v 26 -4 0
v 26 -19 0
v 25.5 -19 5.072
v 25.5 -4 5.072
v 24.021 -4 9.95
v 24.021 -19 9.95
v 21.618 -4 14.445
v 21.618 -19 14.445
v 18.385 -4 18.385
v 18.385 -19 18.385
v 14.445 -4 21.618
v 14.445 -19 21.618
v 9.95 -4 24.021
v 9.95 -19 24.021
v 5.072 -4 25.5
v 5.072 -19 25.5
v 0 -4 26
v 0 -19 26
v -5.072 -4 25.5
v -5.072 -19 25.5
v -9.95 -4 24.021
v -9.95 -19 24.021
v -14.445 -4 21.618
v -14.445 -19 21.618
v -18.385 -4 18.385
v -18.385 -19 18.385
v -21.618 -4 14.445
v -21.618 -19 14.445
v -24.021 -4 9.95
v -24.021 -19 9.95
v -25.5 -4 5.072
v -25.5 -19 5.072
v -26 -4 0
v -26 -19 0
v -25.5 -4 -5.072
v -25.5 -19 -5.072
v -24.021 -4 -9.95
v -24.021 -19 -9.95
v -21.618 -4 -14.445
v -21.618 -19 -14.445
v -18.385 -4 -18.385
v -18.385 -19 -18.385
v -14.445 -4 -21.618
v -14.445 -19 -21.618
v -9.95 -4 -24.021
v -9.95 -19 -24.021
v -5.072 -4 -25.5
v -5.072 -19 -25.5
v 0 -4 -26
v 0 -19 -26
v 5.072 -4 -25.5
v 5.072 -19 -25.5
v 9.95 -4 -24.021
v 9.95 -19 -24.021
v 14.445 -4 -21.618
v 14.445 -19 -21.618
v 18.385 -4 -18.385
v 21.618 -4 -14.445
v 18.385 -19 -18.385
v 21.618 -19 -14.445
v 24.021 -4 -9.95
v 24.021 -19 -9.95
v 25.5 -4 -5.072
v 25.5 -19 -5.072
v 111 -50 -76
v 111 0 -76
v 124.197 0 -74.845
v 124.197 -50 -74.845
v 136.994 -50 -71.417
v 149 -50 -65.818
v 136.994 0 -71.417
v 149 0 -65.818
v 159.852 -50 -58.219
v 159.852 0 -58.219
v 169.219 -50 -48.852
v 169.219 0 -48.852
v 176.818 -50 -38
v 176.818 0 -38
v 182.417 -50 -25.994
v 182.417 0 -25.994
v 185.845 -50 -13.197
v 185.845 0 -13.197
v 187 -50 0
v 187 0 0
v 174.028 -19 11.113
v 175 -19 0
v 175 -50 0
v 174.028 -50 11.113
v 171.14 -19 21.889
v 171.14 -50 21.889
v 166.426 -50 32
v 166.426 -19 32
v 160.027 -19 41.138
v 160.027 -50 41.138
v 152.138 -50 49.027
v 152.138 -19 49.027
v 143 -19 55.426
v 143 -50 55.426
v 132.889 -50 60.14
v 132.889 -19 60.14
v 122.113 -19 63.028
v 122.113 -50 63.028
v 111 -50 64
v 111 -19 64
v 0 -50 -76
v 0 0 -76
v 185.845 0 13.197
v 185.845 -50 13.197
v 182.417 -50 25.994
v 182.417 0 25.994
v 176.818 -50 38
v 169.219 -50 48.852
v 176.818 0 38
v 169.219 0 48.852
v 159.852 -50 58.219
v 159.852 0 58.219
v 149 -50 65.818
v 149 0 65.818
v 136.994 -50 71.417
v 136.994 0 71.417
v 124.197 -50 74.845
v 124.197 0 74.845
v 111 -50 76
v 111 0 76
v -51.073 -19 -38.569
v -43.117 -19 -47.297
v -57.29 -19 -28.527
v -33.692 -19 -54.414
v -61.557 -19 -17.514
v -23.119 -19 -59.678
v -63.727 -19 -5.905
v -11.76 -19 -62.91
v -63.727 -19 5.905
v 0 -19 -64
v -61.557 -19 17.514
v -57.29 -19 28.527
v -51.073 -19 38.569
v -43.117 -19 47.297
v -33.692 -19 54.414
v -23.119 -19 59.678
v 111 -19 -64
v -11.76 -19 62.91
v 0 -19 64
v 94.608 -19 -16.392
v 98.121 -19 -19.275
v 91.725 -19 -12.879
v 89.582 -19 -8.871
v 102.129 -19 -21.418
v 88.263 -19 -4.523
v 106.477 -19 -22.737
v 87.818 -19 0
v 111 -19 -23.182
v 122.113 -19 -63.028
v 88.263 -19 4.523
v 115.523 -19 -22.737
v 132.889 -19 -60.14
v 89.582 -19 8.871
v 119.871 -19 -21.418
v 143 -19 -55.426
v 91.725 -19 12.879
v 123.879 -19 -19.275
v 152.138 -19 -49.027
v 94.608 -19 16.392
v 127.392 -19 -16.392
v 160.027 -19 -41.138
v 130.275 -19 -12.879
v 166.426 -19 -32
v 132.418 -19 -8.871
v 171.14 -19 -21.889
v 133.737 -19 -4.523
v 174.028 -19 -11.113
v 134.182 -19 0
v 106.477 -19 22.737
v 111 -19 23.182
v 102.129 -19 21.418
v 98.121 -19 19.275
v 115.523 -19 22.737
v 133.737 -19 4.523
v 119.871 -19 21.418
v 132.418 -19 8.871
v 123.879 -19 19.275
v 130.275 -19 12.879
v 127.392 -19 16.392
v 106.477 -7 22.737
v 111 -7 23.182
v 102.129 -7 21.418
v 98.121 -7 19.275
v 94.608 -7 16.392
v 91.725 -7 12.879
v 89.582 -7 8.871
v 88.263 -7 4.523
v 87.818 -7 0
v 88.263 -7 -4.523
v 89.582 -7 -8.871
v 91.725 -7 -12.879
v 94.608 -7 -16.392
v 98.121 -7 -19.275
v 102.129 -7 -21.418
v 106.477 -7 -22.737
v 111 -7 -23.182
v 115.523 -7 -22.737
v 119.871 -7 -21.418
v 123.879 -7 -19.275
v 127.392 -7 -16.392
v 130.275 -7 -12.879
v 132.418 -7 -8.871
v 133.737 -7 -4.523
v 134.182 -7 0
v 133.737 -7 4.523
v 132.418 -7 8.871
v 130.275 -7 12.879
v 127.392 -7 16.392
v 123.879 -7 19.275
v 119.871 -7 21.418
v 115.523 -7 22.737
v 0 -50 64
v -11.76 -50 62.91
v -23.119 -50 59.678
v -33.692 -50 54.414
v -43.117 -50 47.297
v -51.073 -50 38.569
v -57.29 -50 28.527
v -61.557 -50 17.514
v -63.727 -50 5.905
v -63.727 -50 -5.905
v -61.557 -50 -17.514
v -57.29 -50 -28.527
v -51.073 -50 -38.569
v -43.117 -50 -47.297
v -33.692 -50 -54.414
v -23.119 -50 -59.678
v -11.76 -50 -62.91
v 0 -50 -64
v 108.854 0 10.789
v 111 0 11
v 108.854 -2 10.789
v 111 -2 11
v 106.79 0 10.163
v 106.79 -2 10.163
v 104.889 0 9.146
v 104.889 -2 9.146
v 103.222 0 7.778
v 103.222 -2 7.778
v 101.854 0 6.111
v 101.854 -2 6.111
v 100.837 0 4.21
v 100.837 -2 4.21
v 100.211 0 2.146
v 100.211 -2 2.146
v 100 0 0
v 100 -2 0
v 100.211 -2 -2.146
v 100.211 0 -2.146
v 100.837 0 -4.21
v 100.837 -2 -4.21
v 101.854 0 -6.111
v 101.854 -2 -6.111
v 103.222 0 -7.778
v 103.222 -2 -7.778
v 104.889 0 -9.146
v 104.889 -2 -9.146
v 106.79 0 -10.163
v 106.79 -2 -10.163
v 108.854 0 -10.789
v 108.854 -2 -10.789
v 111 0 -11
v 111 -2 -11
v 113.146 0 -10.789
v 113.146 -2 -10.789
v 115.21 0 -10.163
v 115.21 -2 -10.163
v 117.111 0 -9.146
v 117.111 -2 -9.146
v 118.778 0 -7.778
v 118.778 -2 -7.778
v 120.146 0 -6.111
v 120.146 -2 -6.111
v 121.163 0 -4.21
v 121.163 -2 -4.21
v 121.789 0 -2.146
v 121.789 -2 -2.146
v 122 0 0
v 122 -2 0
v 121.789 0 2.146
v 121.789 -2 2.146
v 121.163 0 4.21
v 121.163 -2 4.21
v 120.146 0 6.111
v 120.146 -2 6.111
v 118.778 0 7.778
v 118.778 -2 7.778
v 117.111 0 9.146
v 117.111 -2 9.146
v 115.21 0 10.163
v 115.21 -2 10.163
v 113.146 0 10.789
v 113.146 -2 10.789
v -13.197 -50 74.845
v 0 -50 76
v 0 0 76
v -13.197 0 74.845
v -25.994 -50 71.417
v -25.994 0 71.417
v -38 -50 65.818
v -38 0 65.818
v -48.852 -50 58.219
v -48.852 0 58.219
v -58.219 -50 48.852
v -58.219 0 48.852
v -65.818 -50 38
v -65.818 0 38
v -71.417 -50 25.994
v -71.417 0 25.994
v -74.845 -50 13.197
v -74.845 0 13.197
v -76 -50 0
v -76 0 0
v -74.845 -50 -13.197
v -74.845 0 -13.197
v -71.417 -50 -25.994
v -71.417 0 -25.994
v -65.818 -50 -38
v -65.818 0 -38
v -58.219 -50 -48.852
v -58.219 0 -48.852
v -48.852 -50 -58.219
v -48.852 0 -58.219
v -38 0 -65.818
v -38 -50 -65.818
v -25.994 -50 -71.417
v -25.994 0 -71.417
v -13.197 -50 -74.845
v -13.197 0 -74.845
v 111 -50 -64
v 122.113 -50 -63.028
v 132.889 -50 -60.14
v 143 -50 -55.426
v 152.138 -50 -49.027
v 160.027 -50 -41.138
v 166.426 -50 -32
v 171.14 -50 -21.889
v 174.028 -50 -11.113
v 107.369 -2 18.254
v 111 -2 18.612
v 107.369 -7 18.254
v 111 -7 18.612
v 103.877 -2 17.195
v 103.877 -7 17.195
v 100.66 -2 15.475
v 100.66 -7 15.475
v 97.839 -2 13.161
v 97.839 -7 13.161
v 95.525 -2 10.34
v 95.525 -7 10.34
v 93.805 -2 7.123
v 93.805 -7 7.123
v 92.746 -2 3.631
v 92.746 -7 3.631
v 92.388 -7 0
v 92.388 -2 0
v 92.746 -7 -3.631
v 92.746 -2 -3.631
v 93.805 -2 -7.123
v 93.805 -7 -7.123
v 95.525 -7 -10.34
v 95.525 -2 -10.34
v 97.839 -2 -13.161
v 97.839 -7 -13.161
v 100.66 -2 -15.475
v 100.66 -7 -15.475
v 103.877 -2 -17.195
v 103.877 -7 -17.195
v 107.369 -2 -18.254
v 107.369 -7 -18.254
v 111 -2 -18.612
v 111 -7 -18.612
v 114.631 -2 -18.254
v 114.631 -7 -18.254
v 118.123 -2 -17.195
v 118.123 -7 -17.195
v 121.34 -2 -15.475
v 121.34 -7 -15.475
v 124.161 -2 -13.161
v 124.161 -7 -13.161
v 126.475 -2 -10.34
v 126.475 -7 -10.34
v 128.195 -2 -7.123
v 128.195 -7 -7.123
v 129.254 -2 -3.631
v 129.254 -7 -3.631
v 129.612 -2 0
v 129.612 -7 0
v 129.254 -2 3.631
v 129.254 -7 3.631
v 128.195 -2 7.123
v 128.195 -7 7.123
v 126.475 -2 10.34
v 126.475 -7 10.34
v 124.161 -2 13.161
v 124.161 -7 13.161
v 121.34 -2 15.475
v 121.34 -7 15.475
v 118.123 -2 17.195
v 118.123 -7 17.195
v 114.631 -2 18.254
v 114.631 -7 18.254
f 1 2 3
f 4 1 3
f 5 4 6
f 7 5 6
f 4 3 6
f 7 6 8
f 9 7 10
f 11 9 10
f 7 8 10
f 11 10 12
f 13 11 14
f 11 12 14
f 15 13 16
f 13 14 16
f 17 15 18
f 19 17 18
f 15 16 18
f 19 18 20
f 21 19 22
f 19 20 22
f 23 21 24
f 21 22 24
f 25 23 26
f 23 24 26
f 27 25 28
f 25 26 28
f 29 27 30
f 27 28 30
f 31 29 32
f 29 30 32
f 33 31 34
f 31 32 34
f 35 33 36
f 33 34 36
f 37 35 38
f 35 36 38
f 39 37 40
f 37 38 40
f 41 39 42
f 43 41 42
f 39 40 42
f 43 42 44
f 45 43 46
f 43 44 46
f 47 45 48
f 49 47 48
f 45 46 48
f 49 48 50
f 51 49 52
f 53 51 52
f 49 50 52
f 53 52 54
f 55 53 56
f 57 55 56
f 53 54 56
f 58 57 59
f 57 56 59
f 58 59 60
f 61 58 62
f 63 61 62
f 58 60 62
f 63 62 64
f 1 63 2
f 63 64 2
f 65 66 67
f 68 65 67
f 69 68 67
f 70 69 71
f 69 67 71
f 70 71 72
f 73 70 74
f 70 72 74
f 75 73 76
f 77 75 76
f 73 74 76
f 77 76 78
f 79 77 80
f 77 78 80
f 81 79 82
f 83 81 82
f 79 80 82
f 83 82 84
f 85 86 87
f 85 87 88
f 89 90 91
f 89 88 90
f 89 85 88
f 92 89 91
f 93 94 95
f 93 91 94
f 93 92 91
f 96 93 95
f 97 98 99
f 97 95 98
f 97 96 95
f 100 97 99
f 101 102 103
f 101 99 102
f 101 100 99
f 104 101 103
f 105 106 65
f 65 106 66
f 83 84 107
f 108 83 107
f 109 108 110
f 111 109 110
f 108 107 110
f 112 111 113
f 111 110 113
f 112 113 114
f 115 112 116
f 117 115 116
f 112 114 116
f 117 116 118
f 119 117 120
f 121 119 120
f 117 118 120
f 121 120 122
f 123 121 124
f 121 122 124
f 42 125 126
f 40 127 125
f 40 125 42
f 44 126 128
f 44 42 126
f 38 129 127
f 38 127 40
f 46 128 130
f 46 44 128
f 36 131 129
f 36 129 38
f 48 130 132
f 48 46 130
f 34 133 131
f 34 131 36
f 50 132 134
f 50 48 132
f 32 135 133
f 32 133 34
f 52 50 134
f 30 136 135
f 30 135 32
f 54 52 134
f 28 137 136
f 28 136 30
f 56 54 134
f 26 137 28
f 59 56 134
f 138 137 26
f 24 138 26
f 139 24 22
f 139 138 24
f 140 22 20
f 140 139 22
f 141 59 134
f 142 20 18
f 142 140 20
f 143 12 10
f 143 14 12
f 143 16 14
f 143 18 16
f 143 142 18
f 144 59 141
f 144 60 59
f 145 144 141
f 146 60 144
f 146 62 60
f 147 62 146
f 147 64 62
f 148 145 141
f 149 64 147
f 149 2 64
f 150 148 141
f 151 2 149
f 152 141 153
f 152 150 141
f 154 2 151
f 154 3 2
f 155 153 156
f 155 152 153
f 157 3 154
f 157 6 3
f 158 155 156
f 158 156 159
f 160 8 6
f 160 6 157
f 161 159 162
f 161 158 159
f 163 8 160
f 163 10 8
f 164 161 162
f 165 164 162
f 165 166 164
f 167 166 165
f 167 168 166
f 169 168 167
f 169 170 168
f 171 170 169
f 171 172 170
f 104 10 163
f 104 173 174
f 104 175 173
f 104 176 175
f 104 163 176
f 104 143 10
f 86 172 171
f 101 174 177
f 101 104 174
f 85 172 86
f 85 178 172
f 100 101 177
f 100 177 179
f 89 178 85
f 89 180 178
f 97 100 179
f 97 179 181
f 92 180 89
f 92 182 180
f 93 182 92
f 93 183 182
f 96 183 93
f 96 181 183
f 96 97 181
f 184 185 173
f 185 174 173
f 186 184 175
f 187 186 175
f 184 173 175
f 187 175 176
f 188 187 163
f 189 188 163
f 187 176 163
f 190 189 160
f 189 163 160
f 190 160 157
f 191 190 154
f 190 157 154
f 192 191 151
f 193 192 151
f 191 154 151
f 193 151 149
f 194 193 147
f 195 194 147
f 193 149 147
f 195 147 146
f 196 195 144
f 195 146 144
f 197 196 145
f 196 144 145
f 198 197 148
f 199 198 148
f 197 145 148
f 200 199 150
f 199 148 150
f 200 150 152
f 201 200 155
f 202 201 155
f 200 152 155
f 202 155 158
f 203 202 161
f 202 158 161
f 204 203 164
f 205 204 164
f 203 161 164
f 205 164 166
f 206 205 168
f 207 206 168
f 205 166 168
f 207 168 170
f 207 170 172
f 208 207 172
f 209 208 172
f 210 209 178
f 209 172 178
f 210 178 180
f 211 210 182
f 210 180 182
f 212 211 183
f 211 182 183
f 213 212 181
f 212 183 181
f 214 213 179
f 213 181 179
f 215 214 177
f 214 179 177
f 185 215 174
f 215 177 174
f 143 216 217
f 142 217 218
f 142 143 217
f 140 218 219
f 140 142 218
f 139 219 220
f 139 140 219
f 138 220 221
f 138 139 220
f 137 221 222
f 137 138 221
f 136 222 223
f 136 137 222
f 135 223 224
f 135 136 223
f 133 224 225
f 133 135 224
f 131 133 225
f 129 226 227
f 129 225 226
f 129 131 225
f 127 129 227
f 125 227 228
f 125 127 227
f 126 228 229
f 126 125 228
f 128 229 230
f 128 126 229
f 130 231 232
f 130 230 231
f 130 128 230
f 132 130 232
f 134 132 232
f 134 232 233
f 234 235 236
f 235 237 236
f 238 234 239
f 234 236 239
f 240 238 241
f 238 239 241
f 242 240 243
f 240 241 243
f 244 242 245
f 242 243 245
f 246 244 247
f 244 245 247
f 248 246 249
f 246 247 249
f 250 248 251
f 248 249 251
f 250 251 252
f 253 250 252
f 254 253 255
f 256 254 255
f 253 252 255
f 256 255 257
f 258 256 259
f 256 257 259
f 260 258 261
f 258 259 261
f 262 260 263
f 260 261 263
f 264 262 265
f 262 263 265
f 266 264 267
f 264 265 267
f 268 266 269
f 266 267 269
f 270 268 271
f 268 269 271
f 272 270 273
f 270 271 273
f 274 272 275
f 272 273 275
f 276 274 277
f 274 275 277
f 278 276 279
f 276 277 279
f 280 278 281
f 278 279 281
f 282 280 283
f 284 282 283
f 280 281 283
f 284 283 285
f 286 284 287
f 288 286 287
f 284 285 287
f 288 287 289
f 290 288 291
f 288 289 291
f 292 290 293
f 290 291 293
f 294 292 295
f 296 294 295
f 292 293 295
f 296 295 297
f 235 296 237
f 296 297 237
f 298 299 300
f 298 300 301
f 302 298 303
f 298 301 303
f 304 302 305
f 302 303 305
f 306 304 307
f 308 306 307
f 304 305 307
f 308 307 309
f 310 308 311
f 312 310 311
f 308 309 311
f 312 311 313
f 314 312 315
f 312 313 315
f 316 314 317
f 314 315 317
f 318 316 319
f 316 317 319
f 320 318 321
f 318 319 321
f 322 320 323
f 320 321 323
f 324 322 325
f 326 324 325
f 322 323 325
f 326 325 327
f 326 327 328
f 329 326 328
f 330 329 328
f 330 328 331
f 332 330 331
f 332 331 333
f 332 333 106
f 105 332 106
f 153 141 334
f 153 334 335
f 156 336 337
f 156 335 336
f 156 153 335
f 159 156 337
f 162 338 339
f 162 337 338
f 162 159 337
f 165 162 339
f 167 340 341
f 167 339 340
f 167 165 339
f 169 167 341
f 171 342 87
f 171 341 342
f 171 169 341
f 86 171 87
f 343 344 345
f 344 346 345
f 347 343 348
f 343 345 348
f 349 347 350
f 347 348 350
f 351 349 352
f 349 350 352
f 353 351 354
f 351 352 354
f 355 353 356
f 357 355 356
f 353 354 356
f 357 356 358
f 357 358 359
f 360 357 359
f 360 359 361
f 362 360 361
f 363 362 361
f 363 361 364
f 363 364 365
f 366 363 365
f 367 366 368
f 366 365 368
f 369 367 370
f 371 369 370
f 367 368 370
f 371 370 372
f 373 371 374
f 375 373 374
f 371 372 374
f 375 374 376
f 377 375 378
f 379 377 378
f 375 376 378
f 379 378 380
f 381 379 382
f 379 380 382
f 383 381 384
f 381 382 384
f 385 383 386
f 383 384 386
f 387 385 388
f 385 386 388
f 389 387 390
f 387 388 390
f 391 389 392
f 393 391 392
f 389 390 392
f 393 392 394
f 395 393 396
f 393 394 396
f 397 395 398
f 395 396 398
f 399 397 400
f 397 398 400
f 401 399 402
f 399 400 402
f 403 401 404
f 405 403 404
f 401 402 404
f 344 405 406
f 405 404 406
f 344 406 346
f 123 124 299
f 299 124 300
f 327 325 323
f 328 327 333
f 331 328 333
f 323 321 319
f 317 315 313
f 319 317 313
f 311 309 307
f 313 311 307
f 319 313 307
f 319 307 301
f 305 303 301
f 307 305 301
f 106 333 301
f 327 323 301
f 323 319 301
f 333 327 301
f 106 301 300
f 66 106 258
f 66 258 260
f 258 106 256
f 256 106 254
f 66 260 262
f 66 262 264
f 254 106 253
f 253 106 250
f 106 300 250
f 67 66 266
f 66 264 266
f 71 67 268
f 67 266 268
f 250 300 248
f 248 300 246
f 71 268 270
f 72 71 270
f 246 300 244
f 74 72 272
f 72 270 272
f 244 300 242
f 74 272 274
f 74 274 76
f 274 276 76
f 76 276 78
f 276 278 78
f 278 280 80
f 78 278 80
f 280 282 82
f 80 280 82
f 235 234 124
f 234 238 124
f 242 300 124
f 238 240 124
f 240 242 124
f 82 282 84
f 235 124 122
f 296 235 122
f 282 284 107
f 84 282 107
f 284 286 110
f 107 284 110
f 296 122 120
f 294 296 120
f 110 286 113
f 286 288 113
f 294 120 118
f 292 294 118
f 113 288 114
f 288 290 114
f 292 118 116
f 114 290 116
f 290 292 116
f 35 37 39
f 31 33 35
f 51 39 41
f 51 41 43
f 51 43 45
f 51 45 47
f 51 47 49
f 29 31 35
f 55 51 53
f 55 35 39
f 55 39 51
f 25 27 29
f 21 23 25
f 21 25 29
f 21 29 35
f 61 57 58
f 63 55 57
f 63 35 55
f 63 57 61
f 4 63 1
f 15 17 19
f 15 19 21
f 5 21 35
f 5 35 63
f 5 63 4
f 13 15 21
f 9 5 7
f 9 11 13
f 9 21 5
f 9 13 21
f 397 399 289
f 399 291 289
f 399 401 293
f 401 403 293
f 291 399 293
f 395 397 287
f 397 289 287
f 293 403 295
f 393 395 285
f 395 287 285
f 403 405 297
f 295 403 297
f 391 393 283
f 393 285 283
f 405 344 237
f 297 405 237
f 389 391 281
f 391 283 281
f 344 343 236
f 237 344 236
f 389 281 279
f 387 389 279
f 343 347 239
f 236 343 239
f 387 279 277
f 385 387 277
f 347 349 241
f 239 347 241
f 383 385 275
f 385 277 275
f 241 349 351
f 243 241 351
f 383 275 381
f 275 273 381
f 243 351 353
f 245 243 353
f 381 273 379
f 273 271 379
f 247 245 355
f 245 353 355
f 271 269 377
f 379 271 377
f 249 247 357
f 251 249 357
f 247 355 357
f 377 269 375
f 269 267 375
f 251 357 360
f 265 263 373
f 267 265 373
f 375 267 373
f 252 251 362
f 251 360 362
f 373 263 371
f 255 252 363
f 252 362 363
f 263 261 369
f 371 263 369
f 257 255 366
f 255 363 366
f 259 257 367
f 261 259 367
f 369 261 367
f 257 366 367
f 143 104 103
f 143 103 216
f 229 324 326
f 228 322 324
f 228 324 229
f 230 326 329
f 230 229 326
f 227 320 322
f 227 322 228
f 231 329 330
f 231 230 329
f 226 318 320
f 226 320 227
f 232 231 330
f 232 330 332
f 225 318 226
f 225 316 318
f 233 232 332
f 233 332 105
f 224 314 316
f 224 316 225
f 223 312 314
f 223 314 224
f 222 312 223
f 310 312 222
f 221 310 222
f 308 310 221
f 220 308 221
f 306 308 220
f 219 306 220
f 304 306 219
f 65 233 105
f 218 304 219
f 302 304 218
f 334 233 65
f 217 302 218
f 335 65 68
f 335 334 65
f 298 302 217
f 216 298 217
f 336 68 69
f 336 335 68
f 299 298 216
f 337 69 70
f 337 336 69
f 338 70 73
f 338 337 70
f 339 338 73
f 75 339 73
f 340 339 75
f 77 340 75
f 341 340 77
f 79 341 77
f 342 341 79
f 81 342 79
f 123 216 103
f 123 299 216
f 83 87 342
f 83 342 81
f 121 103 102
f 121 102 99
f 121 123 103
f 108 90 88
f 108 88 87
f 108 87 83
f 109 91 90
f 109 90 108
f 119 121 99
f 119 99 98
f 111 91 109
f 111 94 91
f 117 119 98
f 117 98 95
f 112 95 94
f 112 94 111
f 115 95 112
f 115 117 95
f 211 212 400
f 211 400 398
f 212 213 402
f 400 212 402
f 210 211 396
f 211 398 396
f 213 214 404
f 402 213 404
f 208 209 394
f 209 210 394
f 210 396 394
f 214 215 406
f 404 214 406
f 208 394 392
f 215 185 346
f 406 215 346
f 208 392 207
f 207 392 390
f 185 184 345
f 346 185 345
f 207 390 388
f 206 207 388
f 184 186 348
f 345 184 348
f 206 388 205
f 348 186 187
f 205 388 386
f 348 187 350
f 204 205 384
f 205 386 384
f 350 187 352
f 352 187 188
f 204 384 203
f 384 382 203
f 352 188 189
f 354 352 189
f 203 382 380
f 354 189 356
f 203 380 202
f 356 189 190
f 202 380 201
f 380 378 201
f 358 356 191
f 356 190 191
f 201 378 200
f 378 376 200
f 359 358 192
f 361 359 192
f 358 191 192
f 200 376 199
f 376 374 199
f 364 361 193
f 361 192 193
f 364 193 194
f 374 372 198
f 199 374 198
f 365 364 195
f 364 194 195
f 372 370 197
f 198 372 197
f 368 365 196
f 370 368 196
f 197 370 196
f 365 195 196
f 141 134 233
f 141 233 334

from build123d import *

# Parameters (mm, degrees)
F1_DEPTH = 50
F4_DEPTH = 100
F5_DEPTH = 31
F6_R     = 26
F7_DEPTH = 15


with BuildPart() as f1:
    # F0 (on Front) → F1 (new body)
    with BuildSketch(Plane.XZ):
        with BuildLine():
            Line((111, 76), (0, 76))
            ThreePointArc((0, 76), (30.2492433933, 69.7207521053), (55.5, 51.9206124771))
            ThreePointArc((55.5, 51.9206124771), (80.7507566067, 69.7207521053), (111, 76))
        make_face()
        with BuildLine():
            ThreePointArc((55.5, -51.9206124771), (30.2492433933, -69.7207521053), (0, -76))
            Line((0, -76), (111, -76))
            ThreePointArc((111, -76), (80.7507566067, -69.7207521053), (55.5, -51.9206124771))
        make_face()
        with BuildLine():
            ThreePointArc((76, 0), (70.6894617323, 27.9105714739), (55.5, 51.9206124771))
            ThreePointArc((55.5, 51.9206124771), (35, 0), (55.5, -51.9206124771))
            ThreePointArc((55.5, -51.9206124771), (70.6894617323, -27.9105714739), (76, 0))
        make_face()
        with BuildLine():
            ThreePointArc((111, 76), (80.7507566067, 69.7207521053), (55.5, 51.9206124771))
            ThreePointArc((55.5, 51.9206124771), (70.6894617323, 27.9105714739), (76, 0))
            ThreePointArc((76, 0), (70.6894617323, -27.9105714739), (55.5, -51.9206124771))
            ThreePointArc((55.5, -51.9206124771), (80.7507566067, -69.7207521053), (111, -76))
            ThreePointArc((111, -76), (164.7401153702, -53.7401153702), (187, 0))
            ThreePointArc((187, 0), (164.7401153702, 53.7401153702), (111, 76))
        make_face()
        with BuildLine():
            ThreePointArc((55.5, 51.9206124771), (30.2492433933, 69.7207521053), (0, 76))
            ThreePointArc((0, 76), (-76, 0), (0, -76))
            ThreePointArc((0, -76), (30.2492433933, -69.7207521053), (55.5, -51.9206124771))
            ThreePointArc((55.5, -51.9206124771), (35, 0), (55.5, 51.9206124771))
        make_face()
    extrude(amount=F1_DEPTH)

    # F3 (on offset) + F1_face (on face) → F4 (cut)
    with BuildSketch(Plane.XZ.offset(19)):
        with BuildLine():
            ThreePointArc((55.5, 31.870833061), (32.0645184285, 55.3883260078), (0, 64))
            ThreePointArc((0, 64), (-64, 0), (0, -64))
            ThreePointArc((0, -64), (32.0645184285, -55.3883260078), (55.5, -31.870833061))
            ThreePointArc((55.5, -31.870833061), (47, 0), (55.5, 31.870833061))
        make_face()
        with BuildLine():
            Line((111, 64), (0, 64))
            ThreePointArc((0, 64), (32.0645184285, 55.3883260078), (55.5, 31.870833061))
            ThreePointArc((55.5, 31.870833061), (78.9354815715, 55.3883260078), (111, 64))
        make_face()
        with BuildLine():
            ThreePointArc((55.5, -31.870833061), (32.0645184285, -55.3883260078), (0, -64))
            Line((0, -64), (111, -64))
            ThreePointArc((111, -64), (78.9354815715, -55.3883260078), (55.5, -31.870833061))
        make_face()
        with BuildLine():
            ThreePointArc((111, 64), (78.9354815715, 55.3883260078), (55.5, 31.870833061))
            ThreePointArc((55.5, 31.870833061), (61.838499335, 16.4924225025), (64, 0))
            ThreePointArc((64, 0), (61.838499335, -16.4924225025), (55.5, -31.870833061))
            ThreePointArc((55.5, -31.870833061), (78.9354815715, -55.3883260078), (111, -64))
            ThreePointArc((111, -64), (156.2548339959, -45.2548339959), (175, 0))
            ThreePointArc((175, 0), (156.2548339959, 45.2548339959), (111, 64))
        make_face()
    with BuildSketch(Plane(origin=(55.5, -50, 0), x_dir=(1, 0, 0), z_dir=(0, -1, 0))):
        with BuildLine():
            Line((55.5, 76), (-55.5, 76))
            ThreePointArc((-55.5, 76), (-131.5, 0), (-55.5, -76))
            Line((-55.5, -76), (55.5, -76))
            ThreePointArc((55.5, -76), (131.5, 0), (55.5, 76))
        make_face()
    extrude(amount=F4_DEPTH, mode=Mode.SUBTRACT)

    # F5 (cut, through all): a face of the model
    f5_faces = [f1.faces().sort_by_distance(p)[0] for p in [
        (55.5, -50, 0),
    ]]
    extrude(f5_faces, amount=-F5_DEPTH, mode=Mode.SUBTRACT)

    # F6 (on offset) → F7 (cut)
    with BuildSketch(Plane.XZ.offset(19)):
        Circle(F6_R)
    extrude(amount=-F7_DEPTH, mode=Mode.SUBTRACT)

    # F9 (on offset) → F10 (revolve, cut)
    with BuildSketch(Plane.YZ.offset(111)):
        Polygon((-19, 0), (0, 0), (0, 11), (-2, 11), (-2, 18.6120123814), (-7, 18.6120123814), (-7, 23.182326171), (-19, 23.182326171), align=None)
    revolve(axis=Axis((111, -26.2971315533, 0), (0, -1, 0)), mode=Mode.SUBTRACT)


solid = f1.part
